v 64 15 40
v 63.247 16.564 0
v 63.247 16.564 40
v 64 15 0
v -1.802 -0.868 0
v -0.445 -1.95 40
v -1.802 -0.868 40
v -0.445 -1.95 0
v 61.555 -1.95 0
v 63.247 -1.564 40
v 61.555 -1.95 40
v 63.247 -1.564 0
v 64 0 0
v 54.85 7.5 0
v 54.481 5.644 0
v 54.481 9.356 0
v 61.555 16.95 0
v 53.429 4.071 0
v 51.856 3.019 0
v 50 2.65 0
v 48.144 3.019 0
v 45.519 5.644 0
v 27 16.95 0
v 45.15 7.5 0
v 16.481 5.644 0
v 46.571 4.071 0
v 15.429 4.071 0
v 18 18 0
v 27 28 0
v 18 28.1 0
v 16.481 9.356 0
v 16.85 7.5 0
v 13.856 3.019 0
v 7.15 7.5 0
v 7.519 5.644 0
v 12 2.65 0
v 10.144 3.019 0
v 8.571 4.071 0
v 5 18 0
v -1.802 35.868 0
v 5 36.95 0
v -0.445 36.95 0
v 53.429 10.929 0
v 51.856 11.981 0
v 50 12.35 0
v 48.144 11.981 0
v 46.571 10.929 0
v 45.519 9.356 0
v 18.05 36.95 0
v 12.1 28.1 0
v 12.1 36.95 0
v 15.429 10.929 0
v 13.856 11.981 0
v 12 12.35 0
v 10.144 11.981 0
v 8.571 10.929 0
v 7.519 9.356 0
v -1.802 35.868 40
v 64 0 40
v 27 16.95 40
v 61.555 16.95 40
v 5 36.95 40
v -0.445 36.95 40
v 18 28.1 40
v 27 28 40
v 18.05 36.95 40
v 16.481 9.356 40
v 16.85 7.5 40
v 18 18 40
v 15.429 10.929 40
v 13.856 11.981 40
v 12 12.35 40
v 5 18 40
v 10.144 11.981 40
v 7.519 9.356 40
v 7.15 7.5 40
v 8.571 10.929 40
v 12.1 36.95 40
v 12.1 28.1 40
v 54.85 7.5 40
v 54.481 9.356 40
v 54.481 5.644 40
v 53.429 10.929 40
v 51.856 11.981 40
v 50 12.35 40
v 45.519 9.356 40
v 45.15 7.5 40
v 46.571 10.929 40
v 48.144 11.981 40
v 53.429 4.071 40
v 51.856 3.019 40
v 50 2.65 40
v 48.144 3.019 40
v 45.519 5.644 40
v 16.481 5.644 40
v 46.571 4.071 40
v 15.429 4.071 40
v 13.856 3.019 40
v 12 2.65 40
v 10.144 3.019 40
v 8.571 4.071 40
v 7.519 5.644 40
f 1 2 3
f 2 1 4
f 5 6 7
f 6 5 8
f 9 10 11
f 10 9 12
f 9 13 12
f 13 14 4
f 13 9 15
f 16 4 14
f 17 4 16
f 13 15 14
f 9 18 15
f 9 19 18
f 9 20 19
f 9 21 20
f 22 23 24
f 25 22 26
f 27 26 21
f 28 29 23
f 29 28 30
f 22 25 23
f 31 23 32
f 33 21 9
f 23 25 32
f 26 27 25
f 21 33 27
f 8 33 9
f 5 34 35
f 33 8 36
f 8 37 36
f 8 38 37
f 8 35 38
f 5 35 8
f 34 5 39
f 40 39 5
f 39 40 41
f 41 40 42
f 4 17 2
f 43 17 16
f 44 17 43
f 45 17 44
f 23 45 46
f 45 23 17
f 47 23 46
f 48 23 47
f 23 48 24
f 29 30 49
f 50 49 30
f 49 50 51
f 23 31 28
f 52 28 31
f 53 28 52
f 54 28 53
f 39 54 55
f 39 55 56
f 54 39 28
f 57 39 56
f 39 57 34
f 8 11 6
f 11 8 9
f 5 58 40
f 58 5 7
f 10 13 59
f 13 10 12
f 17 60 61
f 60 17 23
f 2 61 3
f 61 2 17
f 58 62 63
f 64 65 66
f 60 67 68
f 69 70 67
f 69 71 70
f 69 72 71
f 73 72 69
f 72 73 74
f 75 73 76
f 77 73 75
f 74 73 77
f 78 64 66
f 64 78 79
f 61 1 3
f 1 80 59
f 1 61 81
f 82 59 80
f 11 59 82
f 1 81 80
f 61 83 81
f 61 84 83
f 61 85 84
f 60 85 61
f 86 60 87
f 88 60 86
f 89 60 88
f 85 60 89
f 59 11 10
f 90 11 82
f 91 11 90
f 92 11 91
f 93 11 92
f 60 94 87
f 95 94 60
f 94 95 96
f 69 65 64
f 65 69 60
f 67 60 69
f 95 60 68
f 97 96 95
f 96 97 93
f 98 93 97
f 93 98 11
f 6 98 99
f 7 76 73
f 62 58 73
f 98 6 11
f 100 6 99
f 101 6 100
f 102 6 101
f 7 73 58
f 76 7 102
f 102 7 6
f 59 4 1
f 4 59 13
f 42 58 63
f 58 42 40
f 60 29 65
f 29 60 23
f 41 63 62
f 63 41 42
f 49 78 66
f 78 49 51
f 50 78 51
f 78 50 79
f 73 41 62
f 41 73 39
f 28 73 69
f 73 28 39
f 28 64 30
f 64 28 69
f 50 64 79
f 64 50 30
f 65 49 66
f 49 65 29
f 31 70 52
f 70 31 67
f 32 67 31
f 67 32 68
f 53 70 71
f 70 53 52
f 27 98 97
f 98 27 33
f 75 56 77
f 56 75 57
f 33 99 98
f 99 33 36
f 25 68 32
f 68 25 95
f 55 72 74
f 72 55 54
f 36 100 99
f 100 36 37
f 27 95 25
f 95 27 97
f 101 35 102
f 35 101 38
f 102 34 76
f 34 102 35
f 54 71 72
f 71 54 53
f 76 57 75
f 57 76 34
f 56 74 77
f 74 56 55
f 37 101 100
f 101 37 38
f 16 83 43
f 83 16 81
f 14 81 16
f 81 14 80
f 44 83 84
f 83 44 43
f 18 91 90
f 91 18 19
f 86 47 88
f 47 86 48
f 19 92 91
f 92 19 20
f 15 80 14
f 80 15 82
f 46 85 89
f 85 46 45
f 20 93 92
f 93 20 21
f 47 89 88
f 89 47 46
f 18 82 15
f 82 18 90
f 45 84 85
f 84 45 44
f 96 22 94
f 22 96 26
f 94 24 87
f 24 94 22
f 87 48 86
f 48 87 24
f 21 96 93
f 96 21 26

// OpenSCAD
difference () {
	union() {
		minkowski(){
			cube([62,15,39]);
			cylinder(r=2,h=1);
			}
		minkowski(){
			translate([0,15,0]) cube([25,20,39]);
			cylinder(r=2,h=1);
			}
	}
		translate([5,18,-1]) cube([7.1,65,42]);
		translate([5,18,-1]) cube([13,10.1,42]);
		translate([30,25,-1])rotate([0,0,45]) cube([10,20.1,42]);
translate([12,7.5,-1]) cylinder(r=9.7/2,h=44);
translate([50,7.5,-1]) cylinder(r=9.7/2,h=44);

}
